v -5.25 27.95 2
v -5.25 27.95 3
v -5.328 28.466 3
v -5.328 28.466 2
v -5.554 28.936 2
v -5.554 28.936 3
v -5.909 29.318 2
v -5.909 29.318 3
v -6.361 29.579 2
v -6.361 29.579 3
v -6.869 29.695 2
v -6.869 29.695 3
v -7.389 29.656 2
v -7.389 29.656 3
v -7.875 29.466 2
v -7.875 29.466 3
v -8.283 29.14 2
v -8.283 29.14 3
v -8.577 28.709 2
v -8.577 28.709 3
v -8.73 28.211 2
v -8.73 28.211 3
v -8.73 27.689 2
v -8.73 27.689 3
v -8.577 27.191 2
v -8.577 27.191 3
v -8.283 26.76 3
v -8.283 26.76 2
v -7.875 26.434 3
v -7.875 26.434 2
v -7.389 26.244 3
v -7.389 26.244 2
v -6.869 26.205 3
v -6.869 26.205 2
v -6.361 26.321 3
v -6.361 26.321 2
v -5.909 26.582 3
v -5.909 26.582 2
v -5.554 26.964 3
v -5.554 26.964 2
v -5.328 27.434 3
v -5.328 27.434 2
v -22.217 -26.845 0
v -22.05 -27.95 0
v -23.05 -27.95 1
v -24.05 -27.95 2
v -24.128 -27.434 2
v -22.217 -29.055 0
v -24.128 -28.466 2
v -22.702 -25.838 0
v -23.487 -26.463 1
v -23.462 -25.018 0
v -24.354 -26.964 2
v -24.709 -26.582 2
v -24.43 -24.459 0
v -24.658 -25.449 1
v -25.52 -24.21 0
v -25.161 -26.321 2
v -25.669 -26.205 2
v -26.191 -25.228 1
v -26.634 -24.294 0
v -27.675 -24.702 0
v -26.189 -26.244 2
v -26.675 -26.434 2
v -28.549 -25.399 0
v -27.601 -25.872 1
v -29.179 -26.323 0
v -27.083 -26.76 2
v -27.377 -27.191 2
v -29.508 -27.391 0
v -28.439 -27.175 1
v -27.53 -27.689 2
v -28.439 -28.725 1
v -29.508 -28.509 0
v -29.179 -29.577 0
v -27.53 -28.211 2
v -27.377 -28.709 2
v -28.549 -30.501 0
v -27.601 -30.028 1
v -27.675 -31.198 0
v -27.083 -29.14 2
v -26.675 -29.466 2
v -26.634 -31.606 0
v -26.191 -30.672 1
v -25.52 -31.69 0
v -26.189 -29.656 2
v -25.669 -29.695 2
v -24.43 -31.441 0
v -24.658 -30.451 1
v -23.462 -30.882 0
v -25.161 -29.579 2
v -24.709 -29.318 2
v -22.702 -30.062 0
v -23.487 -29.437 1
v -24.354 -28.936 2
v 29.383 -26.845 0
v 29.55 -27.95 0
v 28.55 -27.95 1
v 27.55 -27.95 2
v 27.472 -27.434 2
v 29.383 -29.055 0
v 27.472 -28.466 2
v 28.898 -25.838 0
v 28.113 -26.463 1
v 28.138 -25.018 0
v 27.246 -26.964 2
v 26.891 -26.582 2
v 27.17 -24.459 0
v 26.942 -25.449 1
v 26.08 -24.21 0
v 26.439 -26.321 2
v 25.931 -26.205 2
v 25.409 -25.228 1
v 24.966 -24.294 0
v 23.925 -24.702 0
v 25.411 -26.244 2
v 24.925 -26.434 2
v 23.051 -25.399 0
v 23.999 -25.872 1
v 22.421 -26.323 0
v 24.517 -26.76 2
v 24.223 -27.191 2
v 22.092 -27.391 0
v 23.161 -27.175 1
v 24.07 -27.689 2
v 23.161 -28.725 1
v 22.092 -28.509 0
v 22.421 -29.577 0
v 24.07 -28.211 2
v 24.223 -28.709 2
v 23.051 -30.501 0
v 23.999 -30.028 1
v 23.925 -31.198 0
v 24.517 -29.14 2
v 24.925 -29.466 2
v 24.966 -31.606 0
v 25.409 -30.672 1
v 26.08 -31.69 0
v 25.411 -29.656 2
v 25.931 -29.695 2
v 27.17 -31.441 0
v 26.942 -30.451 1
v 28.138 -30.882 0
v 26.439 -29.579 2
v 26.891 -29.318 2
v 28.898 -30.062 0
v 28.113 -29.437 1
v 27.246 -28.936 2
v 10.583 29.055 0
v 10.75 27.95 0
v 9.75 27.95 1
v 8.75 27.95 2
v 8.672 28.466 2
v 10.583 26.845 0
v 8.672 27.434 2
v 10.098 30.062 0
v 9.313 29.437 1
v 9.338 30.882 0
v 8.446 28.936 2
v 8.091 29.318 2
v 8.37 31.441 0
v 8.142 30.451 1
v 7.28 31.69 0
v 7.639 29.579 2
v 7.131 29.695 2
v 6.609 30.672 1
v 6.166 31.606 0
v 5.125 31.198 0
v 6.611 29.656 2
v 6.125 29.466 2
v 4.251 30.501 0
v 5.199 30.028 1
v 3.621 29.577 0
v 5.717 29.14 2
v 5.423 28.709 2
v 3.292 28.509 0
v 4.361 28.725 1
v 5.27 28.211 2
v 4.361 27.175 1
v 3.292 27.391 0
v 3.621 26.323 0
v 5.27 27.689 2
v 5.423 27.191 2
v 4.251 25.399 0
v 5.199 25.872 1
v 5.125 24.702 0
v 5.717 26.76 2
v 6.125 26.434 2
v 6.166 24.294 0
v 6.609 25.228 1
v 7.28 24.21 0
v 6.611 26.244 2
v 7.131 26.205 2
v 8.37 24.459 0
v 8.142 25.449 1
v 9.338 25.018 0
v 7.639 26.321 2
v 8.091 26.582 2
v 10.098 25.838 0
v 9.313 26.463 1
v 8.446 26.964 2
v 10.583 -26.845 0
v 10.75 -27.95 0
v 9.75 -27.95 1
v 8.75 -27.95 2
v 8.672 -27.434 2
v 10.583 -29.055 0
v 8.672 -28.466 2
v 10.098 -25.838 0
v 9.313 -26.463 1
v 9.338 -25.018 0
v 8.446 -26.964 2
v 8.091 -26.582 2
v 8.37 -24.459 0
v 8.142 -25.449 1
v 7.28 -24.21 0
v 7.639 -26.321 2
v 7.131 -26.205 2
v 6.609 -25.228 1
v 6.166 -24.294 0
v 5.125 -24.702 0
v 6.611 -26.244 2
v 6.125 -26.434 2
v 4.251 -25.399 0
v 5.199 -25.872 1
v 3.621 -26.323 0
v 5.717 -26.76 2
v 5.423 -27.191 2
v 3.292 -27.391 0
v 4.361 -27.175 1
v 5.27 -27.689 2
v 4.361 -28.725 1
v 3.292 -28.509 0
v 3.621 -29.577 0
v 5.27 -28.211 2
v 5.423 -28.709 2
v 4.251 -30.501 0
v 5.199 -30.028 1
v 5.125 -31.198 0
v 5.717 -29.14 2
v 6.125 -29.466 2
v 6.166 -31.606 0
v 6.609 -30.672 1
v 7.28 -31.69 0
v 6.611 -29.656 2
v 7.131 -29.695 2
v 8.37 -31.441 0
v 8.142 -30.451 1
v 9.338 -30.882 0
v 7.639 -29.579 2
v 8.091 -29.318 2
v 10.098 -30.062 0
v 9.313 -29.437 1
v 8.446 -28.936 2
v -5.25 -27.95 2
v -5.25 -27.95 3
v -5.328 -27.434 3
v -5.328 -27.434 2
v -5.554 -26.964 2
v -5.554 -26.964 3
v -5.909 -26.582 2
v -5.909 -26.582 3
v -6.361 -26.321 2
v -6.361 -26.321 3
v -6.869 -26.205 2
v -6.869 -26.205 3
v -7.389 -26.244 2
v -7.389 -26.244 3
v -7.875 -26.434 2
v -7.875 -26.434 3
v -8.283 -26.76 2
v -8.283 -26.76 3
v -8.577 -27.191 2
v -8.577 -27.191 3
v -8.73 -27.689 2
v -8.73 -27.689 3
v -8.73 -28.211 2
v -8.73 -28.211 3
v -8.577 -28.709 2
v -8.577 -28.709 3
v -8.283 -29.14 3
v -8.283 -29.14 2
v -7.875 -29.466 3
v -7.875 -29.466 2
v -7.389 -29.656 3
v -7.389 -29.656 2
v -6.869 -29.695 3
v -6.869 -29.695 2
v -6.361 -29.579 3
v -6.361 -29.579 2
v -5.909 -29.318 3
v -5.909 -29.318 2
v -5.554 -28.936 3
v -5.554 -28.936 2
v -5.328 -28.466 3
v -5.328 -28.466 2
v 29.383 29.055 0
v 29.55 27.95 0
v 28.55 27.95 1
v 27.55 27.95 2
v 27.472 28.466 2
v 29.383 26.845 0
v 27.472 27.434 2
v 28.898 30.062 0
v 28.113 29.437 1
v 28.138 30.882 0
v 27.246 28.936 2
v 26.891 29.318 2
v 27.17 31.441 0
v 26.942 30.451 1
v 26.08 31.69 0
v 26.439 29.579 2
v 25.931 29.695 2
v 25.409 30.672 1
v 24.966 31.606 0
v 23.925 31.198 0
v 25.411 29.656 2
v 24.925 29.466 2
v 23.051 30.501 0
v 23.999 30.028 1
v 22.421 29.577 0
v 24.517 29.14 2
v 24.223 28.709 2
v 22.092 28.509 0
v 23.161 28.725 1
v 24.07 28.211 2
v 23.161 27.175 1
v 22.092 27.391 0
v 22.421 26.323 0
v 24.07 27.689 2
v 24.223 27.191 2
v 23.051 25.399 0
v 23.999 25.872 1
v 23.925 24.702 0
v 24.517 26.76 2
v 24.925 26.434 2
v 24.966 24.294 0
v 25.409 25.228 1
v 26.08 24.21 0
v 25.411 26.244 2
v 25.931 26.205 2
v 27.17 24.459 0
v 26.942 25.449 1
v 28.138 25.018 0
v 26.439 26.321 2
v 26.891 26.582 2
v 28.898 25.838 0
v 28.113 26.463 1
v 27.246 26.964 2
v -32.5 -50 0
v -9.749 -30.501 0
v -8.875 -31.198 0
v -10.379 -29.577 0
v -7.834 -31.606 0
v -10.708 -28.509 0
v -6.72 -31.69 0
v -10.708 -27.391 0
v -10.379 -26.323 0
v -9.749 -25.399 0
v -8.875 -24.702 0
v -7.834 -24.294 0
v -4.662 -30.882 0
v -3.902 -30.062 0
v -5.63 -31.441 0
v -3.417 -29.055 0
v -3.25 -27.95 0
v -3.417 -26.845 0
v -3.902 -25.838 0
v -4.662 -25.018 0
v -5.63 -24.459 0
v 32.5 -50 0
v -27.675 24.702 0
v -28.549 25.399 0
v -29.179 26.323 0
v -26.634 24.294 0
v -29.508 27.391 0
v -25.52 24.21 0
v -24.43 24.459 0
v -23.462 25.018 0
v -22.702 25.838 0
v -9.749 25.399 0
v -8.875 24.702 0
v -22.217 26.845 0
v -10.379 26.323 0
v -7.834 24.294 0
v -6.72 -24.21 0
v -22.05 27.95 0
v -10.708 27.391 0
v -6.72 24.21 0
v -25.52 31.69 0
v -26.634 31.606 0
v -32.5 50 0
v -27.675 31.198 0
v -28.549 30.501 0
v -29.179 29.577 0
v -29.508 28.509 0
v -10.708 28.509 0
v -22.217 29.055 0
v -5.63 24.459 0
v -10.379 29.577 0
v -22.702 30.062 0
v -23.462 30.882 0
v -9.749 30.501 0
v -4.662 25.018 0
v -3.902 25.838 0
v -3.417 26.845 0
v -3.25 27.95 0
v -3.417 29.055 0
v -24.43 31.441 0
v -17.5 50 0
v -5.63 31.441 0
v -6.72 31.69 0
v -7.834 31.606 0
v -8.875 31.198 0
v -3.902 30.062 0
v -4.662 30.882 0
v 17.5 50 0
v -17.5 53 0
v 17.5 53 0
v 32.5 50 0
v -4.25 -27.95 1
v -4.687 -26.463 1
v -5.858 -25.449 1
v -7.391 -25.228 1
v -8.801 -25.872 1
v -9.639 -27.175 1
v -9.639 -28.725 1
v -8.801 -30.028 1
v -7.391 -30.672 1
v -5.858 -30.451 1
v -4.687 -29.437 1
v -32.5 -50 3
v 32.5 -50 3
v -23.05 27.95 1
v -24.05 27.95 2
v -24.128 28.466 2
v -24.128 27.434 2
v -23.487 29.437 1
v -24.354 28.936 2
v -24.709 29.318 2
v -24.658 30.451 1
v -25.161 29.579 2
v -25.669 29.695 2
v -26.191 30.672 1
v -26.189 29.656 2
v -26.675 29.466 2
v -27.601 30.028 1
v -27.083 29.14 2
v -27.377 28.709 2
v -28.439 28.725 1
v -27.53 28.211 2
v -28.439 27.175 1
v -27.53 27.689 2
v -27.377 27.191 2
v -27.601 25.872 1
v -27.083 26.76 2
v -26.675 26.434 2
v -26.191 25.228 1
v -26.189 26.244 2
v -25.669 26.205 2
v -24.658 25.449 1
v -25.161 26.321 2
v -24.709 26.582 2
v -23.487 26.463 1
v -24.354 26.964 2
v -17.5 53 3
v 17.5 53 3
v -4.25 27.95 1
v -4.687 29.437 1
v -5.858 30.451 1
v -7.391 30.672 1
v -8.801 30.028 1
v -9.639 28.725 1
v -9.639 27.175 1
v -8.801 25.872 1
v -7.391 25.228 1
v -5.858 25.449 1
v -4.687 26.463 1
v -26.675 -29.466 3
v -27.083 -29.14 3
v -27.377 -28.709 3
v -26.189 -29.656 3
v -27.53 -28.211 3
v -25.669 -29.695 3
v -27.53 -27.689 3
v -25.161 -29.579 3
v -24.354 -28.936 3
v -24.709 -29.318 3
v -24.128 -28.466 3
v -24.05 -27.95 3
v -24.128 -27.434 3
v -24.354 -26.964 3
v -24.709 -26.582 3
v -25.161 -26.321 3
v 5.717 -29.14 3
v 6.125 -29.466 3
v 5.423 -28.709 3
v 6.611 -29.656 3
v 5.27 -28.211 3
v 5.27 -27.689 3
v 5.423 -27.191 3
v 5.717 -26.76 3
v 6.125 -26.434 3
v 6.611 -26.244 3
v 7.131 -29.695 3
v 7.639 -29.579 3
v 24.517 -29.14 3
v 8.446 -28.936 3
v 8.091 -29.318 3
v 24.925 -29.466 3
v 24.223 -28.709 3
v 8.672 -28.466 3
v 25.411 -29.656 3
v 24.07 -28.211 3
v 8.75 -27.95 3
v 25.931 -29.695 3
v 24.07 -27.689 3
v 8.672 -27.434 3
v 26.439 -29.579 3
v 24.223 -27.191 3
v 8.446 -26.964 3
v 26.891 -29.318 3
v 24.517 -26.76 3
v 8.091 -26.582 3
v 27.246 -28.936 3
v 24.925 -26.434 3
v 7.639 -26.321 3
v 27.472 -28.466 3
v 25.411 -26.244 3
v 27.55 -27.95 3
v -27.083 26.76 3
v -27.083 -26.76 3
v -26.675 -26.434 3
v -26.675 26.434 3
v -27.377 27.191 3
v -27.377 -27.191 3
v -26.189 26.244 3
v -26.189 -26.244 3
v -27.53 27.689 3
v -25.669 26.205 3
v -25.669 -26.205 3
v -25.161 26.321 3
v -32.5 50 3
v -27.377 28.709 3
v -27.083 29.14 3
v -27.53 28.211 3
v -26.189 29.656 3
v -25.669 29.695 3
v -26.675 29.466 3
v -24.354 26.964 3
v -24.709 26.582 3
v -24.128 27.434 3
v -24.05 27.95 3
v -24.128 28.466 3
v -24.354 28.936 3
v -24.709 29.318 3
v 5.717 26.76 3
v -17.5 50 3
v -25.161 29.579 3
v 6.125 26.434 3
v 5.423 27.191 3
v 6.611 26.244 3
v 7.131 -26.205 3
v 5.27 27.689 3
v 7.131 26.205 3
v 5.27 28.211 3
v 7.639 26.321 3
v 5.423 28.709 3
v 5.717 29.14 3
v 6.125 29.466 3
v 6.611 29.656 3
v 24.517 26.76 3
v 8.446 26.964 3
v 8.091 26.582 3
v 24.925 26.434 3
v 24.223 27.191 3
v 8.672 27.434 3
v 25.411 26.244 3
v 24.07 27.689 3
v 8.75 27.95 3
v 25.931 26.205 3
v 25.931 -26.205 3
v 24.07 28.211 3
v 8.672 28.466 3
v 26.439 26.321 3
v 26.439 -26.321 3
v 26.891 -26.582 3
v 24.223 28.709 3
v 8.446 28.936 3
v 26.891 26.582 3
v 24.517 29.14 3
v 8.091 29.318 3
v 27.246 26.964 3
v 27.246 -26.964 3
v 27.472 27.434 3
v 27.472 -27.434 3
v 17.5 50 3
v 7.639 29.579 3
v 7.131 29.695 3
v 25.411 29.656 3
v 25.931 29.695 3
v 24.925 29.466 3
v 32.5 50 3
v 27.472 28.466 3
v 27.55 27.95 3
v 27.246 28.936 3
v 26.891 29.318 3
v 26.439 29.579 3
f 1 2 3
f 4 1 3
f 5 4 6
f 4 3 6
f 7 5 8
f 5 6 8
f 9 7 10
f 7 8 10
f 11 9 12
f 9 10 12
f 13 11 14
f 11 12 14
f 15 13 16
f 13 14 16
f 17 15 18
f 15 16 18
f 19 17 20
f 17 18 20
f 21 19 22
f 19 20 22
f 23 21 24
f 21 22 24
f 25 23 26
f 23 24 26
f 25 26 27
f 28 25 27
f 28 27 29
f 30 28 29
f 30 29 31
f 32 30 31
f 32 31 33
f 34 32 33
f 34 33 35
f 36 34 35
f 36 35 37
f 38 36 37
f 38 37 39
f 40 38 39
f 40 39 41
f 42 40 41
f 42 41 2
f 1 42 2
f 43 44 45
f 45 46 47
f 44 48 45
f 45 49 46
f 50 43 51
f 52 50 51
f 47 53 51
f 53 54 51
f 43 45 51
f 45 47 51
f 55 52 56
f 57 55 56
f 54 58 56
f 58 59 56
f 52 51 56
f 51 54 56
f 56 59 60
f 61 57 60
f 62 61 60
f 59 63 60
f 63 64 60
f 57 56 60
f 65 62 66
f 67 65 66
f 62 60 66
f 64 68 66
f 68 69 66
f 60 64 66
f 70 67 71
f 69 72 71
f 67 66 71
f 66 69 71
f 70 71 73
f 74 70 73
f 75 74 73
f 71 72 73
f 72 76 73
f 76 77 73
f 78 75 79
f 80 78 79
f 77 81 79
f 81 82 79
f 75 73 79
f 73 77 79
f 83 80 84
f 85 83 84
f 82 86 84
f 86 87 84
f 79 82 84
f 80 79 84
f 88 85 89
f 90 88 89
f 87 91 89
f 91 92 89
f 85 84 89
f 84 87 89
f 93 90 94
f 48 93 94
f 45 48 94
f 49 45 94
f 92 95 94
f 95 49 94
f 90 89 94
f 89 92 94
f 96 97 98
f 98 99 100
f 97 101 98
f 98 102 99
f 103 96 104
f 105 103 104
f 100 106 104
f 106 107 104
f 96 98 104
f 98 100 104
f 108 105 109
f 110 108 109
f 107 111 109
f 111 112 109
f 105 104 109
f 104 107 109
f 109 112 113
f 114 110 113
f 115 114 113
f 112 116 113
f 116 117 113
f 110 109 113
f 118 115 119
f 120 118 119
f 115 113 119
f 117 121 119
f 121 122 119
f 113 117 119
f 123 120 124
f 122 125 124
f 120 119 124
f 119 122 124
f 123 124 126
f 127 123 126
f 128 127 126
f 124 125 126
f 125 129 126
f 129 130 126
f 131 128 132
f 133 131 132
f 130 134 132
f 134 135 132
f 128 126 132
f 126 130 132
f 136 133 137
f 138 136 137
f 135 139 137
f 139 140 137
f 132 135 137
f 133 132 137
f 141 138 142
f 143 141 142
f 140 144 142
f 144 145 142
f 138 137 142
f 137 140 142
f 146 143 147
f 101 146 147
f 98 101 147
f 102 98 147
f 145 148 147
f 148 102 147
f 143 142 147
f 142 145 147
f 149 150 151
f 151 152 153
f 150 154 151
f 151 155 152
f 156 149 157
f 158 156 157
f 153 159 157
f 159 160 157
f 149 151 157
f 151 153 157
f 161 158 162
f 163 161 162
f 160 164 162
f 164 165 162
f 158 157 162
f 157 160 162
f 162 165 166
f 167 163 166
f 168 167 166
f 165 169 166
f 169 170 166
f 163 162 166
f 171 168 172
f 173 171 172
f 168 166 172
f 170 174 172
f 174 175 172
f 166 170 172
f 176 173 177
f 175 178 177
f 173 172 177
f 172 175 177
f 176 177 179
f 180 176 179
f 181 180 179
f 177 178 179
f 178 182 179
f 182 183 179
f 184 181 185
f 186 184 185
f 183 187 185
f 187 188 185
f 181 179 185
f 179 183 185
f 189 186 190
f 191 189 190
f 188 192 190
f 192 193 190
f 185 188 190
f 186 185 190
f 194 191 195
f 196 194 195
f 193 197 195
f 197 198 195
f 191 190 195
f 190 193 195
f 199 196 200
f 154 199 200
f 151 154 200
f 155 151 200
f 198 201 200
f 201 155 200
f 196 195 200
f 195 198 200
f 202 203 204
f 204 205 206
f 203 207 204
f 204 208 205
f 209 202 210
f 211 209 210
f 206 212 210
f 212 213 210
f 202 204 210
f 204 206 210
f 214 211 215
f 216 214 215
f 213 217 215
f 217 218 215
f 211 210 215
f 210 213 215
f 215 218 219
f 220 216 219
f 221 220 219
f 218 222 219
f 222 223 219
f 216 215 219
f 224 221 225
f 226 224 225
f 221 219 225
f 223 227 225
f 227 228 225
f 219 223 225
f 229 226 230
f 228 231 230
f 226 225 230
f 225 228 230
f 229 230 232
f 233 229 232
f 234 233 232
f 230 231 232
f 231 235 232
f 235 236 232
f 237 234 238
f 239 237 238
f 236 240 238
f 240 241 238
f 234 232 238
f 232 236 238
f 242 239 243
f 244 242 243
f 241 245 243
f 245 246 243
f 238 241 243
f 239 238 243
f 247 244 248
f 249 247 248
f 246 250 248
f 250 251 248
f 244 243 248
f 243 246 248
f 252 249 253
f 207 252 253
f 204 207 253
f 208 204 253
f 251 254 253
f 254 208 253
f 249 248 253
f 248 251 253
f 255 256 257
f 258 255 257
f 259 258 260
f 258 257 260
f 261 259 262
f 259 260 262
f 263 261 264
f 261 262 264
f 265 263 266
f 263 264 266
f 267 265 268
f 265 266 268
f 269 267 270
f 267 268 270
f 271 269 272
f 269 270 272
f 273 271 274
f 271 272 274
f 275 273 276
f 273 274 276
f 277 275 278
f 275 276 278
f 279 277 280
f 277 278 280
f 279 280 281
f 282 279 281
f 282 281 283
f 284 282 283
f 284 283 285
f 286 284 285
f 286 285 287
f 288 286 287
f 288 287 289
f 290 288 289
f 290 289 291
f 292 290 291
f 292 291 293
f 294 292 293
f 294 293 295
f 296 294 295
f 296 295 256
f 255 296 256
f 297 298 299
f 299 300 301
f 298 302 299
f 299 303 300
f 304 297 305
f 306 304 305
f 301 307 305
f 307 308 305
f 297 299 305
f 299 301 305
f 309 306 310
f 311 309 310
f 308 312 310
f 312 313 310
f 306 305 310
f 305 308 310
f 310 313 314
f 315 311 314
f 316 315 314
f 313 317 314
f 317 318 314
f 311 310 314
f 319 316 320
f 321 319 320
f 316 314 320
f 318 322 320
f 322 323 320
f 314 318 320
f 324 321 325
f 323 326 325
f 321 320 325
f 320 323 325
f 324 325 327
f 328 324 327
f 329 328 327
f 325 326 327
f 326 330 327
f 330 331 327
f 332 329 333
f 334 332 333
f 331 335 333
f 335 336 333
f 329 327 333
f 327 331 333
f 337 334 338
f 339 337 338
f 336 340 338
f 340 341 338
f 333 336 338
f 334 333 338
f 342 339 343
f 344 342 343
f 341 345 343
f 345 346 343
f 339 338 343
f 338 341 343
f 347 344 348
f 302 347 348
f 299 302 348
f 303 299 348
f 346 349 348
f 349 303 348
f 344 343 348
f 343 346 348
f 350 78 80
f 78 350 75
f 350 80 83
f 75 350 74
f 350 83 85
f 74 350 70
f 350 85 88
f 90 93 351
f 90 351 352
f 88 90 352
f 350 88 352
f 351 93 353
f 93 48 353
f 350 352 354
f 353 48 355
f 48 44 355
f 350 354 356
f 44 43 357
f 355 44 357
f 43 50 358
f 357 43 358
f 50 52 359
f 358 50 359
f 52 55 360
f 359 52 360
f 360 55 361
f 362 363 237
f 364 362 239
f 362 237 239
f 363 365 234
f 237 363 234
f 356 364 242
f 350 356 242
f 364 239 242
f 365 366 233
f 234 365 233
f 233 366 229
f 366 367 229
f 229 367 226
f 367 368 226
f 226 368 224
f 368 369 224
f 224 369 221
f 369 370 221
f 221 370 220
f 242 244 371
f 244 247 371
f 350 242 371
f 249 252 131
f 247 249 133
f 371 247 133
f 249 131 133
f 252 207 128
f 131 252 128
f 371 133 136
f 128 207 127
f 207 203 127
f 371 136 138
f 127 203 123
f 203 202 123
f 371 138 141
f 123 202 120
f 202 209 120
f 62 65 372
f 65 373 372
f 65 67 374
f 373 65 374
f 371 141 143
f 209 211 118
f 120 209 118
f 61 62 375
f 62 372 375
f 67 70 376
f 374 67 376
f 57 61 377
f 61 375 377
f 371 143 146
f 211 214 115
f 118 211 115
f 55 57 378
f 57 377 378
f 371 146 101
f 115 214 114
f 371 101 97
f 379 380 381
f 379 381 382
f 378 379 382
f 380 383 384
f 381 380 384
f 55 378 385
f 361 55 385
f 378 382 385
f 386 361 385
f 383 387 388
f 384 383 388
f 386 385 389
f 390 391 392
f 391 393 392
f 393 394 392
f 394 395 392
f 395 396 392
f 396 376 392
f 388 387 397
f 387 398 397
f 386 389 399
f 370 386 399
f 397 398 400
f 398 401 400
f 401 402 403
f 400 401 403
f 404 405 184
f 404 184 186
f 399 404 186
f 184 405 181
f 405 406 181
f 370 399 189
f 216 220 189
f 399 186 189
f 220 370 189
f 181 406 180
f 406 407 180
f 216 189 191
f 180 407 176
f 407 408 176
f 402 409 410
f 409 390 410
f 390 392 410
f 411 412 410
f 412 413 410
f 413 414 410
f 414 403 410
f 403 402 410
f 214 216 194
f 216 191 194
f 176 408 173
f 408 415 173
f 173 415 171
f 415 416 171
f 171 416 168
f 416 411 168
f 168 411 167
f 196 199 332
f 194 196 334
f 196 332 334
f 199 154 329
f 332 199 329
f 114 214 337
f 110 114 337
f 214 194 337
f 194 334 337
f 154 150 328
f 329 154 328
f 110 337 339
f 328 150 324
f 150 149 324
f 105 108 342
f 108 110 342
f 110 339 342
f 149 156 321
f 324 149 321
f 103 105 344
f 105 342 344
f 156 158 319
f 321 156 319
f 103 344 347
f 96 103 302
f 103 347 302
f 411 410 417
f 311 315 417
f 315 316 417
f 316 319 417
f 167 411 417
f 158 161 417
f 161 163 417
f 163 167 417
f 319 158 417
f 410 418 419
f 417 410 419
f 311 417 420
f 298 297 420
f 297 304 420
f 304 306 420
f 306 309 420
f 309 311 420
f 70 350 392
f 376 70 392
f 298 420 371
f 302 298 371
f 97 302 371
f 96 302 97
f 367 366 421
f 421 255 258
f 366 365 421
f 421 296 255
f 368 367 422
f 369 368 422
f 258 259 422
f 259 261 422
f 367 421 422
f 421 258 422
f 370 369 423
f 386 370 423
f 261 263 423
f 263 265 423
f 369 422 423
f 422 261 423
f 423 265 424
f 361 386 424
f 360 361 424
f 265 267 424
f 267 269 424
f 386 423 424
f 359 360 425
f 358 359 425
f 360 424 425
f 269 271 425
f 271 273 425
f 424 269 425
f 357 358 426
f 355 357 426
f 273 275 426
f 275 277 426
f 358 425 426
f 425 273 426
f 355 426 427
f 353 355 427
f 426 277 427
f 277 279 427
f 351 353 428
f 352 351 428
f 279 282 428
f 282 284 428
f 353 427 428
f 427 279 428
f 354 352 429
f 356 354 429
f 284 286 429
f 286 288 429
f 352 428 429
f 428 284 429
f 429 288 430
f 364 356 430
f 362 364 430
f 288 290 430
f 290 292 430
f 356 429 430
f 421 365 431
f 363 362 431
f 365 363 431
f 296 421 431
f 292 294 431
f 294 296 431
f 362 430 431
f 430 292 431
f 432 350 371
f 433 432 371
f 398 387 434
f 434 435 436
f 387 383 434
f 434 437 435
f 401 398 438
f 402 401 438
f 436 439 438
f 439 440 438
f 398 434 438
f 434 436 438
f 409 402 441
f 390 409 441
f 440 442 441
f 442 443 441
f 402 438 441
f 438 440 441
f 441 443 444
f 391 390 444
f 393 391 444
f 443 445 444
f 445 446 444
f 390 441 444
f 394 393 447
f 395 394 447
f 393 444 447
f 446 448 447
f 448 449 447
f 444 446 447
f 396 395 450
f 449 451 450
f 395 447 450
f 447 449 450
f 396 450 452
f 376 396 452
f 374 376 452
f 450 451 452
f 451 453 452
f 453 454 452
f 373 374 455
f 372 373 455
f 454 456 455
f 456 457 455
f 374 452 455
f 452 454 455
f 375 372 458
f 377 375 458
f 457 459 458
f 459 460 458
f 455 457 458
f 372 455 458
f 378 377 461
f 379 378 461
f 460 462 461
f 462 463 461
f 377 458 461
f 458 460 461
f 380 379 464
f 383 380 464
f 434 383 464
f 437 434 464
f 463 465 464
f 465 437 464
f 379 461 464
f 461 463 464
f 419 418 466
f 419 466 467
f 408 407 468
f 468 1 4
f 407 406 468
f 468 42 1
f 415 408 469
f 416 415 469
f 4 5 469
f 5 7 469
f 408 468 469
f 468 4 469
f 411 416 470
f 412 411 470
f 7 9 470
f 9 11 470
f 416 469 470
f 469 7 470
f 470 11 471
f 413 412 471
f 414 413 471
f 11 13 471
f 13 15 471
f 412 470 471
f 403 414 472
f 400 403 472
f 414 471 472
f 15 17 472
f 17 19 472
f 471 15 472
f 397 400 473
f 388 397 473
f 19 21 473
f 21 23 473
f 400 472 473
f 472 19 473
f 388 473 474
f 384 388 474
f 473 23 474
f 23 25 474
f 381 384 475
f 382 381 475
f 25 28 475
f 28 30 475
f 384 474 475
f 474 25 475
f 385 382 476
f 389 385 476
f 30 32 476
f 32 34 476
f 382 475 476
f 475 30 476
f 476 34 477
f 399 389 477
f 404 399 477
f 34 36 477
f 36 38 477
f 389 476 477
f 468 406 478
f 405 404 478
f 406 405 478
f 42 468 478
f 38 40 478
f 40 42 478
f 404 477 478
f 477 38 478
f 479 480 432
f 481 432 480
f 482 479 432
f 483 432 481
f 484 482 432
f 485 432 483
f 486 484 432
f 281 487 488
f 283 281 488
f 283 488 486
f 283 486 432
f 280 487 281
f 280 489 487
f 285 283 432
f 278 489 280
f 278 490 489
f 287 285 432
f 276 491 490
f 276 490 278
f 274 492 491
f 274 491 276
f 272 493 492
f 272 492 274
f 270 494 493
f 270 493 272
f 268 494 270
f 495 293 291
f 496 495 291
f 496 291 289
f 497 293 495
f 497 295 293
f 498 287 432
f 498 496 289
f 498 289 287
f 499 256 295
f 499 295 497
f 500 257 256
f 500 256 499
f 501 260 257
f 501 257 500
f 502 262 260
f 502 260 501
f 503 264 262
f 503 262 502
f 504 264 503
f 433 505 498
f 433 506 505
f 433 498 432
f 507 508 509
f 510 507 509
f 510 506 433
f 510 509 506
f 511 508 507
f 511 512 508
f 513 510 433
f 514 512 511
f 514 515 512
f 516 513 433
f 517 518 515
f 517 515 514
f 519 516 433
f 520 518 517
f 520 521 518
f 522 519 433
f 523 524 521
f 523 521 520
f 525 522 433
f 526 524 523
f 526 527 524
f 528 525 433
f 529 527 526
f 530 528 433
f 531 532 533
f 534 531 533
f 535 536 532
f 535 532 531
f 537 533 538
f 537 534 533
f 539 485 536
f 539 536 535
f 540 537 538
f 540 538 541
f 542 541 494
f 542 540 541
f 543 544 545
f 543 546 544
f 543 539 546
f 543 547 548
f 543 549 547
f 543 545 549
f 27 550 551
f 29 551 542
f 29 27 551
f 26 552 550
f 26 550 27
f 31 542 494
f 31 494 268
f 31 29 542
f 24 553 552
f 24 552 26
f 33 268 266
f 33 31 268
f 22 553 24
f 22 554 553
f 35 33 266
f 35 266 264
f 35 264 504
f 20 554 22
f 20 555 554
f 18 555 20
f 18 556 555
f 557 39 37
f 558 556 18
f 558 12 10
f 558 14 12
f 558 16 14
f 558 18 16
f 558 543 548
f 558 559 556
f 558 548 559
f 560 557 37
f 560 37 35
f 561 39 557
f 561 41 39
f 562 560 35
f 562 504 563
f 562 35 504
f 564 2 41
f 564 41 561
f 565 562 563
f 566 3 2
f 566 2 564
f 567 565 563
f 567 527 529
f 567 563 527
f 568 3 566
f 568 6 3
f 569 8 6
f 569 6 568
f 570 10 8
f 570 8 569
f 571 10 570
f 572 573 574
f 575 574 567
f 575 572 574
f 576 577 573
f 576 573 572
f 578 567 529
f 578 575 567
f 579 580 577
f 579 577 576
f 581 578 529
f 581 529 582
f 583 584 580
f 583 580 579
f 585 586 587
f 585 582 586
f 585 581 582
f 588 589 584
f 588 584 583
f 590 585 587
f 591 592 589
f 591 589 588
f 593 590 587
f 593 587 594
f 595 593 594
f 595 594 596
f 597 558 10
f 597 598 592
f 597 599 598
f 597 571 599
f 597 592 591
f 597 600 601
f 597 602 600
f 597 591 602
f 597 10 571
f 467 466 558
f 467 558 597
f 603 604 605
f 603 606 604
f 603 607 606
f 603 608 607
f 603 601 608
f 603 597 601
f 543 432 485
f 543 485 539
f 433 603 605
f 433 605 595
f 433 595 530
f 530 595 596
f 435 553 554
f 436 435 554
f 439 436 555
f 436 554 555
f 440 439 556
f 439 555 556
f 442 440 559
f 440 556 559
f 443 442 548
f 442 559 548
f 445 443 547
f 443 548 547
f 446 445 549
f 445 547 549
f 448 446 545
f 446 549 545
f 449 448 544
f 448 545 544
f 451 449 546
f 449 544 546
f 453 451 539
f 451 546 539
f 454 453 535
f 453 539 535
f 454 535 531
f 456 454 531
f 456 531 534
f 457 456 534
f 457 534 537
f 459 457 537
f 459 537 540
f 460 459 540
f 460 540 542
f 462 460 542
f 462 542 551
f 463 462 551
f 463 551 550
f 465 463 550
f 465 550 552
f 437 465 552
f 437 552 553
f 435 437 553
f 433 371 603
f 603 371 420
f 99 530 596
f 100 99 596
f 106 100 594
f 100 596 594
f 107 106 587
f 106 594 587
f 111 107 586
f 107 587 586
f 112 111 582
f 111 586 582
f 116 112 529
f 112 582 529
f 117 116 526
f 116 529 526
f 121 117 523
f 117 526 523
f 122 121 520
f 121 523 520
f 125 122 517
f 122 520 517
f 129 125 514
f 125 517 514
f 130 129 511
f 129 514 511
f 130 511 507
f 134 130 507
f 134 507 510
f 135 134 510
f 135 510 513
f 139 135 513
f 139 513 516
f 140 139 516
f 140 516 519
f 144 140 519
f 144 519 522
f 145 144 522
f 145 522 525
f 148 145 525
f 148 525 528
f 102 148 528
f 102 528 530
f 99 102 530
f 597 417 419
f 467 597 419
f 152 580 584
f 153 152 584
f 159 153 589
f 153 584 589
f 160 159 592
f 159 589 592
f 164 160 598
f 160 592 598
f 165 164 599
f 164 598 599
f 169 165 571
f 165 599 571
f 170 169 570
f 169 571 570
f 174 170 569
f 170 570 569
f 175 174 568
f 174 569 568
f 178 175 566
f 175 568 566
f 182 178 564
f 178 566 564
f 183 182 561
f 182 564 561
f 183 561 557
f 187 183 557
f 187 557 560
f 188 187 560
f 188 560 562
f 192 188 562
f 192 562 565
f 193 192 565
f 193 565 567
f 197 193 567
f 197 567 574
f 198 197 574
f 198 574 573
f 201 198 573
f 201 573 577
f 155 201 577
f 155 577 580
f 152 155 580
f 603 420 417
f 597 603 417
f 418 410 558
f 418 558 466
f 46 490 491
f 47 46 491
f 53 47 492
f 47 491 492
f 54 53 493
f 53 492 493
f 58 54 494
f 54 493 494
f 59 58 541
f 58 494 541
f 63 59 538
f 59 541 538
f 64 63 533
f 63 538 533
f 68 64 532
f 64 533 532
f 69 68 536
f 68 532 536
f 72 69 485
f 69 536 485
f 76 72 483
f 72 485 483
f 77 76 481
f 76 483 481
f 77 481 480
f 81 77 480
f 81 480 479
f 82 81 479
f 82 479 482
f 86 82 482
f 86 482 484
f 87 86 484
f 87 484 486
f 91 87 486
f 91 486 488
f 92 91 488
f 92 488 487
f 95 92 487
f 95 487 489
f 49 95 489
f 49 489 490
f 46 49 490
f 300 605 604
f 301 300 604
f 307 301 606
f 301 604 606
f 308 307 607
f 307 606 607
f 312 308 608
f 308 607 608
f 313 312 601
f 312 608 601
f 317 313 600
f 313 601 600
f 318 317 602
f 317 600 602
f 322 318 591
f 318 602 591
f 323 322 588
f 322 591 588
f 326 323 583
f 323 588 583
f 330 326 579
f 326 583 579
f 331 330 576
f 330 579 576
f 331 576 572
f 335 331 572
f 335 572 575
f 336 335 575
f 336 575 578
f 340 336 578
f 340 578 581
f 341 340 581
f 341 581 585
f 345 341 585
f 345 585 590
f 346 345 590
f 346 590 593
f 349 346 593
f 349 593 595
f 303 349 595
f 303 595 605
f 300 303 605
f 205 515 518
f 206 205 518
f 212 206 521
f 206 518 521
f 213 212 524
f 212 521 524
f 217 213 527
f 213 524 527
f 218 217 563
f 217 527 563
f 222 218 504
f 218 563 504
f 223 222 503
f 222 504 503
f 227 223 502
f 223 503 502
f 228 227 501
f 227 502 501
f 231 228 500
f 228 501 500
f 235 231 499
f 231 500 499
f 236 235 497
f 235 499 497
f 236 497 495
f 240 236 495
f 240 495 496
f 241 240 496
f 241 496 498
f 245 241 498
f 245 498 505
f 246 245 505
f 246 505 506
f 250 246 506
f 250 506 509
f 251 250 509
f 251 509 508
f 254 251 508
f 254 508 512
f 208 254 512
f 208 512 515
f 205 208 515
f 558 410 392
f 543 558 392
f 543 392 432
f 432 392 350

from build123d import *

# Parameters (mm, degrees)
SKETCH_1_W          = 35
SKETCH_1_H          = 3
EXTRUDE_1_DEPTH     = 3
SKETCH_2_R          = 1.75
CUT_EXTRUDE_1_DEPTH = 10
CHAMFER_1_SIZE      = 2


with BuildPart() as part:
    # Эскиз1 → Бобышка-Вытянуть1 (new body)
    with BuildSketch(Plane.XY):
        Polygon((-32.5, 50), (-32.5, -50), (32.5, -50), (32.5, 50), (17.5, 50), (17.5, 47), (-17.5, 47), (-17.5, 50), align=None)
        with Locations((0, 48.5)):
            Rectangle(SKETCH_1_W, SKETCH_1_H)
        with Locations((0, 51.5)):
            Rectangle(SKETCH_1_W, SKETCH_1_H)
    extrude(amount=EXTRUDE_1_DEPTH)

    # Эскиз2 → Вырез-Вытянуть1 (cut)
    with BuildSketch(Plane.XY.offset(3)):
        with Locations((-25.8, 27.95)):
            Circle(SKETCH_2_R)
        with Locations((-7, 27.95)):
            Circle(SKETCH_2_R)
        with Locations((7, 27.95)):
            Circle(SKETCH_2_R)
        with Locations((25.8, 27.95)):
            Circle(SKETCH_2_R)
        with Locations((-25.8, -27.95)):
            Circle(SKETCH_2_R)
        with Locations((-7, -27.95)):
            Circle(SKETCH_2_R)
        with Locations((7, -27.95)):
            Circle(SKETCH_2_R)
        with Locations((25.8, -27.95)):
            Circle(SKETCH_2_R)
    extrude(amount=-CUT_EXTRUDE_1_DEPTH, mode=Mode.SUBTRACT)

    # Фаска1
    chamfer_1_edges = [part.edges().sort_by_distance(p)[0] for p in [
        (-27.55, -27.95, 0),
        (24.05, 27.95, 0),
        (5.25, 27.95, 0),
        (-8.75, 27.95, 0),
        (-8.75, -27.95, 0),
        (5.25, -27.95, 0),
        (24.05, -27.95, 0),
        (-27.55, 27.95, 0),
    ]]
    chamfer(chamfer_1_edges, length=CHAMFER_1_SIZE)


solid = part.part
